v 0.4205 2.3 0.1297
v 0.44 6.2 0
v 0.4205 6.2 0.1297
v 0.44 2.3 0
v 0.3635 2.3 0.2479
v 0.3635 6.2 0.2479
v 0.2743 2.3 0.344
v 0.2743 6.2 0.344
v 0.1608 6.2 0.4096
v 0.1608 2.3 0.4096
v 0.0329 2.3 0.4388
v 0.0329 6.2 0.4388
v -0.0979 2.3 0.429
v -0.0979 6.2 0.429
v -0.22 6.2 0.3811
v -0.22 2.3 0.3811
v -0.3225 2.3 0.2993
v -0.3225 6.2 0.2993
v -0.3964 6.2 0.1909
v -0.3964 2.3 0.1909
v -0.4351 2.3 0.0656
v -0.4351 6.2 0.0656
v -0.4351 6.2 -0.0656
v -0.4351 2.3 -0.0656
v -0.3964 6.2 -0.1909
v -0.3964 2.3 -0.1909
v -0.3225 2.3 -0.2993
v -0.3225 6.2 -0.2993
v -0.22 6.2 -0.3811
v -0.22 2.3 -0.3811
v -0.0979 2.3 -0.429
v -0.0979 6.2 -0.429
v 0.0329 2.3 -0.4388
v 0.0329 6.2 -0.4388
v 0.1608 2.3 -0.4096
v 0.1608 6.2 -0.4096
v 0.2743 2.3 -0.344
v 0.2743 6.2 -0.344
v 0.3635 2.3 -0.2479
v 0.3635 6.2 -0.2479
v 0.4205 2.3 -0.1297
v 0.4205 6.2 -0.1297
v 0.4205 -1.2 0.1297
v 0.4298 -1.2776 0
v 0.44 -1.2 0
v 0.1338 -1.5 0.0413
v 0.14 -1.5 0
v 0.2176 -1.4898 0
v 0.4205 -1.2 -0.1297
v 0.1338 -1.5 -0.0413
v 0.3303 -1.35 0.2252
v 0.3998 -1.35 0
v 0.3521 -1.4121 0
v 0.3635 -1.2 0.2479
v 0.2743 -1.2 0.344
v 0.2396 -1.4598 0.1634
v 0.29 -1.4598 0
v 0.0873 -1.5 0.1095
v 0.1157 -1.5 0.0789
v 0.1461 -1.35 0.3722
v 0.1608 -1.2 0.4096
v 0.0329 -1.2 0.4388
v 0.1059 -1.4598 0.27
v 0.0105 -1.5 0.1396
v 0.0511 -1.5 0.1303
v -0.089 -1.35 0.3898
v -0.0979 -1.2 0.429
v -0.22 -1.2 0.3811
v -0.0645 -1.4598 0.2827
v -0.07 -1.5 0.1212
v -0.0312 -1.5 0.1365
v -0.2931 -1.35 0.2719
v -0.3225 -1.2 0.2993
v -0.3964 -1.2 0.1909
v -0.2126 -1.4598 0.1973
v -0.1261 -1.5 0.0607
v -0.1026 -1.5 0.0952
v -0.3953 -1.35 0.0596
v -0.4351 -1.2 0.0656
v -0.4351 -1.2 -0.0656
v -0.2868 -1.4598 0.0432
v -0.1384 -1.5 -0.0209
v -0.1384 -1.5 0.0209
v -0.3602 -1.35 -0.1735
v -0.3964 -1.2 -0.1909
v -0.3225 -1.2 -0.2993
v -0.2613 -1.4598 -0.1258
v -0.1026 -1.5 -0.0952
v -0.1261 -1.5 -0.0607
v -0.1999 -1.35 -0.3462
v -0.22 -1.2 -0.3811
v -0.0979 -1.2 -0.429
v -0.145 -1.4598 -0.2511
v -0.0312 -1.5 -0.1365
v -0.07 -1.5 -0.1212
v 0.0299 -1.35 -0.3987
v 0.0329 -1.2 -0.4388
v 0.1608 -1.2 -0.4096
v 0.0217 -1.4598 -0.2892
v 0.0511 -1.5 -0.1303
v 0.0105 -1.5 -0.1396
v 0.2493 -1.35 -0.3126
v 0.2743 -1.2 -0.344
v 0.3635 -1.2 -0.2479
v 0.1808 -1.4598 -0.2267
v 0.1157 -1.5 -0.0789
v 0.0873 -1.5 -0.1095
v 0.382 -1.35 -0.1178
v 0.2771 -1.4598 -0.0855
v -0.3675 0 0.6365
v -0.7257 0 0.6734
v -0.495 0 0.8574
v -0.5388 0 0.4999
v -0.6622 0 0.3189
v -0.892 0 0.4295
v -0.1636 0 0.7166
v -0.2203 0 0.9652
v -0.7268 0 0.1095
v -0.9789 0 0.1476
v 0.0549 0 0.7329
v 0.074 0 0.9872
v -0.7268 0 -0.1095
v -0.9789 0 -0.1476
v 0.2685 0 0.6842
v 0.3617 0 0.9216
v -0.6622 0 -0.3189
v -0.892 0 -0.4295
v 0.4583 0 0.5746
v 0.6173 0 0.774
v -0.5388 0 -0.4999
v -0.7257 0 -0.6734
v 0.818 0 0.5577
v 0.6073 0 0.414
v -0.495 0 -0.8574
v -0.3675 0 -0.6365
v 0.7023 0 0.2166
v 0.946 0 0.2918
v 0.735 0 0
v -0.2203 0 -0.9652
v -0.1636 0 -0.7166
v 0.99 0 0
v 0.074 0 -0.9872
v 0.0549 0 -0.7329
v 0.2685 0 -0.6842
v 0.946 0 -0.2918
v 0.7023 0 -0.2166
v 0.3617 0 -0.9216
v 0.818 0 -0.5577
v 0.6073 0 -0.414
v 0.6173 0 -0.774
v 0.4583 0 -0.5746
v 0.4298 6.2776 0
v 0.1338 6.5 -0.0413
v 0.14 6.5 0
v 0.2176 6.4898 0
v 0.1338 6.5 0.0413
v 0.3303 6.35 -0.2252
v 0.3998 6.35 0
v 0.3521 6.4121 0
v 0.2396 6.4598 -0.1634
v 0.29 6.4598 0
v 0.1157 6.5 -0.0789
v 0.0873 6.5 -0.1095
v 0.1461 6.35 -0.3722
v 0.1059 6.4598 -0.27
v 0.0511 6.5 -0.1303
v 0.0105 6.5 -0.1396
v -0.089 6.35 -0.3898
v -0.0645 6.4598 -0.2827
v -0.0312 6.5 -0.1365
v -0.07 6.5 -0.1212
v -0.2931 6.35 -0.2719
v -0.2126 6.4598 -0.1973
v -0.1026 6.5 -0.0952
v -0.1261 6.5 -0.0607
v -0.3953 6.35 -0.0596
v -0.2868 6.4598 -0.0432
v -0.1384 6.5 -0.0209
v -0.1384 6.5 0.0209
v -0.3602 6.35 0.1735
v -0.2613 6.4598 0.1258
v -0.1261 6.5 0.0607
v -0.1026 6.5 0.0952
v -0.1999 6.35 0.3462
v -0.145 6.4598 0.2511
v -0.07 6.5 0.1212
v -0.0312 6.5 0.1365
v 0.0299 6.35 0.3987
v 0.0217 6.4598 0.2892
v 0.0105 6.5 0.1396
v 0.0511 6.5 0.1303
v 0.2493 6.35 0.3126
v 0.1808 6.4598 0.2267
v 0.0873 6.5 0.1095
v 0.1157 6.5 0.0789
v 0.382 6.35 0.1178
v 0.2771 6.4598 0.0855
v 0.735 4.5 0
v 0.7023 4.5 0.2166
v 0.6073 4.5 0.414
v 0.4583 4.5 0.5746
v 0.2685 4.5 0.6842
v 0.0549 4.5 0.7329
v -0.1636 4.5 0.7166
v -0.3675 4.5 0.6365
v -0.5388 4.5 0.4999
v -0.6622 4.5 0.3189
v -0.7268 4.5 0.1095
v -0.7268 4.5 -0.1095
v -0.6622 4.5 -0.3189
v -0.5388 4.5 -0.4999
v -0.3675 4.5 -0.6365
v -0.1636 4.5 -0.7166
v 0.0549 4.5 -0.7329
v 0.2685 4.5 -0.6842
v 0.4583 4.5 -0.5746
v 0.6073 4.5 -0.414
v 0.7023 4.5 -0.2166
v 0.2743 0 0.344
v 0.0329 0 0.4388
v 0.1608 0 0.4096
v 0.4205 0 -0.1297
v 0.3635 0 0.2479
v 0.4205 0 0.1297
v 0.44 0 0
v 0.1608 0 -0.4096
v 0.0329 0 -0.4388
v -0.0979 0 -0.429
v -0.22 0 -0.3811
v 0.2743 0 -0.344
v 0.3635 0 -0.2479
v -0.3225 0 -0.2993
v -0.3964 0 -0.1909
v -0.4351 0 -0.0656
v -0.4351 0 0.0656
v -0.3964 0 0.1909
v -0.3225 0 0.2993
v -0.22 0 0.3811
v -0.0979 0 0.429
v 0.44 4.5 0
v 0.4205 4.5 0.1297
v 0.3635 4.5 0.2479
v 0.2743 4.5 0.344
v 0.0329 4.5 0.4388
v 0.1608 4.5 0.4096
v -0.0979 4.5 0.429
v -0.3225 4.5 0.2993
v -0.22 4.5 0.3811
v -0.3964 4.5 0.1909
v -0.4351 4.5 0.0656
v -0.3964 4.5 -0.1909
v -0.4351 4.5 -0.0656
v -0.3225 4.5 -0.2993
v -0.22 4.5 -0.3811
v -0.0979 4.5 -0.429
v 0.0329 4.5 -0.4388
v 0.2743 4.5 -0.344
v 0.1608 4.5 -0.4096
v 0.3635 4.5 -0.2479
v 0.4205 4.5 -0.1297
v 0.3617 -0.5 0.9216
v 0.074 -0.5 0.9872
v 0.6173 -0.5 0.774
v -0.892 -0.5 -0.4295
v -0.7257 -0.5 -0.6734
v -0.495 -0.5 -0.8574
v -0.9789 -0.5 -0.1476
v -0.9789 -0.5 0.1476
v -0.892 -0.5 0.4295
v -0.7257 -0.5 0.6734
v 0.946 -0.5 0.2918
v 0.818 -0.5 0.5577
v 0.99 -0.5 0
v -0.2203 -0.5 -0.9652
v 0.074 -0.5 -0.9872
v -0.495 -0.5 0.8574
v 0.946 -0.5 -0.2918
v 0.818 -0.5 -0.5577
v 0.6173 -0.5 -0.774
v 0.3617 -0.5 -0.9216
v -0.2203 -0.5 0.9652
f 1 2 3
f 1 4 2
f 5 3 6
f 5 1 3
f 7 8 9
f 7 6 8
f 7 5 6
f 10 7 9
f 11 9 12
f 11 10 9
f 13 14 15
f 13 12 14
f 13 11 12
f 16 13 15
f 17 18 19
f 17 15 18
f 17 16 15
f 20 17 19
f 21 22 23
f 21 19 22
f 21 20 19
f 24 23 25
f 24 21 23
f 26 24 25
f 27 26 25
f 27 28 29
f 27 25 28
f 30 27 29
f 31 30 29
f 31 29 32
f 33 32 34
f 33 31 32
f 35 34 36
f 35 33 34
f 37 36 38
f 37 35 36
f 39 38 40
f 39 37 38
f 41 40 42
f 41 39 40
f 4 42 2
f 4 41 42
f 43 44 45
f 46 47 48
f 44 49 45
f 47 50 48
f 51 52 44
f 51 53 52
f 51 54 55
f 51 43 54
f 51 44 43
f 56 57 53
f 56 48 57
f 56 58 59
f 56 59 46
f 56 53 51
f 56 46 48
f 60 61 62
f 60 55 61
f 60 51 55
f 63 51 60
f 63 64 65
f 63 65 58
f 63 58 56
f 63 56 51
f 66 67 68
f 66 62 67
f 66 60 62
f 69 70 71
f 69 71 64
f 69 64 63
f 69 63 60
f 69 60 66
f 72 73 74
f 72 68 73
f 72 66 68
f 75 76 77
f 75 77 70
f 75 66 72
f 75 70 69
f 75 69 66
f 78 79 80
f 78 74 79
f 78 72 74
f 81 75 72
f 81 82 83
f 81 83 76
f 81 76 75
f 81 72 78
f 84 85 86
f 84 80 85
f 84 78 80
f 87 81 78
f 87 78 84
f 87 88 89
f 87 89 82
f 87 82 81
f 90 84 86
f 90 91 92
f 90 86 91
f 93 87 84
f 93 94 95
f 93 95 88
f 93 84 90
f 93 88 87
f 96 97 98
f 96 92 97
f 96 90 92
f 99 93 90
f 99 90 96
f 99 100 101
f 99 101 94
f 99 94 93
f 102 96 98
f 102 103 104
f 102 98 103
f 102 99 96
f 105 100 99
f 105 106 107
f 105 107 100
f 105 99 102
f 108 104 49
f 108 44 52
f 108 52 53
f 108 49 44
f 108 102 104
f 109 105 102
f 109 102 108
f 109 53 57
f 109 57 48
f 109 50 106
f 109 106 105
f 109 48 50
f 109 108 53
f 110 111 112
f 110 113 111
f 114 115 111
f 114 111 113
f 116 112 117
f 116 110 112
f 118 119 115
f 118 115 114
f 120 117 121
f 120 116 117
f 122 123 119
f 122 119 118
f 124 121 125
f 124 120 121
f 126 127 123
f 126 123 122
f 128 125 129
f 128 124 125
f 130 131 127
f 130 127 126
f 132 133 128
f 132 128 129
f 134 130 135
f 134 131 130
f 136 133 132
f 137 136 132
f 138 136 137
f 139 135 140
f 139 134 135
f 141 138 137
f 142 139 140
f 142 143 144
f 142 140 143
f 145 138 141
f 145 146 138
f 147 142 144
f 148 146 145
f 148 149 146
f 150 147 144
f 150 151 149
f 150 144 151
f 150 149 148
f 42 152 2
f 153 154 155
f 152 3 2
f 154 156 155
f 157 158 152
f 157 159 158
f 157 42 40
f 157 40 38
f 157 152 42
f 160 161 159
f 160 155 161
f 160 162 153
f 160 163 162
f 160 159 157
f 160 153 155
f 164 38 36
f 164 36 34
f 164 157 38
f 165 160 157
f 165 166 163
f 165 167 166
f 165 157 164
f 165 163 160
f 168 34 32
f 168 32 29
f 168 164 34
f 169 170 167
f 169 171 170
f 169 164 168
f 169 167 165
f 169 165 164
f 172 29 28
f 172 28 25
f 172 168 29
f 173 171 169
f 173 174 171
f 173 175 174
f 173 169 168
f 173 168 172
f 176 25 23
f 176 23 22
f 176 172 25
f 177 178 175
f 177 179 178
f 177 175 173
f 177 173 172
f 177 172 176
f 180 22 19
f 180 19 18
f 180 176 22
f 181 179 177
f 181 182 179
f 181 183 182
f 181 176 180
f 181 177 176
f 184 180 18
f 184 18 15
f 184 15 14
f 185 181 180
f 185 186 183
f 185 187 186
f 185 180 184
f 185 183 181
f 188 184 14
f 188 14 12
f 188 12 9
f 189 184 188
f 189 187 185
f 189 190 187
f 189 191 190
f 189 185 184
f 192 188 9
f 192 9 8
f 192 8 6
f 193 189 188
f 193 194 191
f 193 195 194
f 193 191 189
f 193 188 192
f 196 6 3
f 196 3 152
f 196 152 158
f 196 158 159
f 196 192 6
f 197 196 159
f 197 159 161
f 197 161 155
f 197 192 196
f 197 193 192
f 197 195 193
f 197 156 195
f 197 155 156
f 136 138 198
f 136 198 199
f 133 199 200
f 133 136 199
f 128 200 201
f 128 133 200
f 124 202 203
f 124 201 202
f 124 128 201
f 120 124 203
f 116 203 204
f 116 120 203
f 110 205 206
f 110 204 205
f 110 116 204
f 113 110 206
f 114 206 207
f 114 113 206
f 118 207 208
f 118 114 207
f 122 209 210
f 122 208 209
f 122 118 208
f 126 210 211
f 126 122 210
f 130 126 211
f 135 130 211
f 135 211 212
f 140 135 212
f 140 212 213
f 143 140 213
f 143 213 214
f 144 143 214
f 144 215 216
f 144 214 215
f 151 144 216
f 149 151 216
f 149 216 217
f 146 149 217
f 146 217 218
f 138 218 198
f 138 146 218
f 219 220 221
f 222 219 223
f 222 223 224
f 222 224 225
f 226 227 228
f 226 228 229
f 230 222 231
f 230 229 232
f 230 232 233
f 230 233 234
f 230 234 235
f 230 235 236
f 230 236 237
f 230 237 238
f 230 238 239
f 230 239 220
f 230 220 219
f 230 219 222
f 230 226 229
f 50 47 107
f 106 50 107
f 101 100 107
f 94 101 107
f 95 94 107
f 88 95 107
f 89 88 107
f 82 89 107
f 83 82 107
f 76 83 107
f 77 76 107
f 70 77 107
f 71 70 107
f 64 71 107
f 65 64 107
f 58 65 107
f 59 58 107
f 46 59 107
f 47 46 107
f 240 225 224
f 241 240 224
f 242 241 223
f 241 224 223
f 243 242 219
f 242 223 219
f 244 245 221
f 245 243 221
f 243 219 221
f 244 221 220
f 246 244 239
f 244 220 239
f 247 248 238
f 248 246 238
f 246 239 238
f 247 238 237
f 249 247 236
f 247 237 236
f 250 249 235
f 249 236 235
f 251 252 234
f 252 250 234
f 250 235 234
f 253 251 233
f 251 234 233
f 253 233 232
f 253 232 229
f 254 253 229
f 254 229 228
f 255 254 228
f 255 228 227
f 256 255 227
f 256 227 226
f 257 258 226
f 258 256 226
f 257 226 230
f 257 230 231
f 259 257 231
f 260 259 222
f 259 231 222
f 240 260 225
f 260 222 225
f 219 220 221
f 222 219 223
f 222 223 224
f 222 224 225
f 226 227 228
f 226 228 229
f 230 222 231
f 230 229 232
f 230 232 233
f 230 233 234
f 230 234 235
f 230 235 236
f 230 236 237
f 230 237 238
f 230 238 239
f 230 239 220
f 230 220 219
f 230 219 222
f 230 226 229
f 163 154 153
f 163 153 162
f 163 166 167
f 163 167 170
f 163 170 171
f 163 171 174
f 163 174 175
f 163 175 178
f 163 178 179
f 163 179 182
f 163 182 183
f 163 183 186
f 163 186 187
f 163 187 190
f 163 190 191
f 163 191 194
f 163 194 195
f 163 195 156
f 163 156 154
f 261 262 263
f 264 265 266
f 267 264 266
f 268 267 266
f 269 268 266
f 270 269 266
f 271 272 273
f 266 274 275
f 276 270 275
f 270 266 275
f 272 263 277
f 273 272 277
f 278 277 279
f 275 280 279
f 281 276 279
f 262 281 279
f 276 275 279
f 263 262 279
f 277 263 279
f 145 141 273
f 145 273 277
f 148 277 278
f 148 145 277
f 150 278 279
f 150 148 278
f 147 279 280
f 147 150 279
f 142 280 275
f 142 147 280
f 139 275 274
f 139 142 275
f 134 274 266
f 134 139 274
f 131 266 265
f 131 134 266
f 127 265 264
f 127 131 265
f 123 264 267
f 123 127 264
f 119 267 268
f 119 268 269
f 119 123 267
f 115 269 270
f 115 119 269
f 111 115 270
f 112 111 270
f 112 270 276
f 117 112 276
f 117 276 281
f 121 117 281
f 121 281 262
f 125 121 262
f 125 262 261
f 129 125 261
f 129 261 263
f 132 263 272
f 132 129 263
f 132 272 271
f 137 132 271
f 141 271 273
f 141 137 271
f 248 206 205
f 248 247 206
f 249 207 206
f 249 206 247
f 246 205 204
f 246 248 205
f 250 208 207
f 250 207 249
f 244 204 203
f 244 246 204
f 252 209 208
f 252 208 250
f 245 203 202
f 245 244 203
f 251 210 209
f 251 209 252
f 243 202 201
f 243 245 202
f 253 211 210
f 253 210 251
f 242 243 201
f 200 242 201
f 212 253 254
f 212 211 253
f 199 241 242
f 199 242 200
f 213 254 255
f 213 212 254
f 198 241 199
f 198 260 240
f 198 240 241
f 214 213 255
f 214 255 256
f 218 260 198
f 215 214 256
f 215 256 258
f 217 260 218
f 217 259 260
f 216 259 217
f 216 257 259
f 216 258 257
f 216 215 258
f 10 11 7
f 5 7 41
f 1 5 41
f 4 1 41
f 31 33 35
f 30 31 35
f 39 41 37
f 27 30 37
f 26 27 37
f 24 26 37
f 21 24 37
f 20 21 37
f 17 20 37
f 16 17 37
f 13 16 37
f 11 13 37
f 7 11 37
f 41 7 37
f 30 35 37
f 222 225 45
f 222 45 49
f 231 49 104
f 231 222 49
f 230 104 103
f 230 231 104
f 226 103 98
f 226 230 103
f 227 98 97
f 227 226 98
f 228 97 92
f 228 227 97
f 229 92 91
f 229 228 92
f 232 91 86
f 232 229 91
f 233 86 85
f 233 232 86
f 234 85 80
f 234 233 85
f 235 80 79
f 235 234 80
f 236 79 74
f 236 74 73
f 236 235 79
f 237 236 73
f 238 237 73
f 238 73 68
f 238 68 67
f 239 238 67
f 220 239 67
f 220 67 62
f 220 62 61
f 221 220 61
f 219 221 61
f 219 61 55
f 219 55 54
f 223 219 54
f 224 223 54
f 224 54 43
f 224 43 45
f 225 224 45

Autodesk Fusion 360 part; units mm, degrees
sketch "Skizze1" plane through (0, 0, 0) normal (0, 1, 0) x (1, 0, 0)
  circle A0 centre (0, 0) radius 0.99
  circle A1 centre (0, 0) radius 0.44
  circle A2 centre (0, 0) radius 0.735
  dimension "d1" = 1.98
  dimension "d2" = 0.88
  dimension "d3" = 1.47
extrude "Extrusion1" add sketch "Skizze1" against normal blind 0.5 contours A0 | A1 | A2 makes body 1
extrude "Extrusion2" add sketch "Skizze1" along normal blind 4.5 contours A2 bodies 1
extrude "Extrusion3" add sketch "Skizze1" against normal blind 1.5 separate body contours A1 makes body 2
extrude "Extrusion4" add sketch "Skizze1" along normal blind 6.5 and the other way blind -2.3 separate body contours A1 makes body 3
fillet "Abrundung1" radius 0.3 1 edges at (-0.4102, 6.5, 0.1591) on bodies 3
fillet "Abrundung2" radius 0.3 1 edges at (-0.4102, -1.5, -0.1591) on bodies 2
equation "d6 = 5 mm - 0.5 mm"
